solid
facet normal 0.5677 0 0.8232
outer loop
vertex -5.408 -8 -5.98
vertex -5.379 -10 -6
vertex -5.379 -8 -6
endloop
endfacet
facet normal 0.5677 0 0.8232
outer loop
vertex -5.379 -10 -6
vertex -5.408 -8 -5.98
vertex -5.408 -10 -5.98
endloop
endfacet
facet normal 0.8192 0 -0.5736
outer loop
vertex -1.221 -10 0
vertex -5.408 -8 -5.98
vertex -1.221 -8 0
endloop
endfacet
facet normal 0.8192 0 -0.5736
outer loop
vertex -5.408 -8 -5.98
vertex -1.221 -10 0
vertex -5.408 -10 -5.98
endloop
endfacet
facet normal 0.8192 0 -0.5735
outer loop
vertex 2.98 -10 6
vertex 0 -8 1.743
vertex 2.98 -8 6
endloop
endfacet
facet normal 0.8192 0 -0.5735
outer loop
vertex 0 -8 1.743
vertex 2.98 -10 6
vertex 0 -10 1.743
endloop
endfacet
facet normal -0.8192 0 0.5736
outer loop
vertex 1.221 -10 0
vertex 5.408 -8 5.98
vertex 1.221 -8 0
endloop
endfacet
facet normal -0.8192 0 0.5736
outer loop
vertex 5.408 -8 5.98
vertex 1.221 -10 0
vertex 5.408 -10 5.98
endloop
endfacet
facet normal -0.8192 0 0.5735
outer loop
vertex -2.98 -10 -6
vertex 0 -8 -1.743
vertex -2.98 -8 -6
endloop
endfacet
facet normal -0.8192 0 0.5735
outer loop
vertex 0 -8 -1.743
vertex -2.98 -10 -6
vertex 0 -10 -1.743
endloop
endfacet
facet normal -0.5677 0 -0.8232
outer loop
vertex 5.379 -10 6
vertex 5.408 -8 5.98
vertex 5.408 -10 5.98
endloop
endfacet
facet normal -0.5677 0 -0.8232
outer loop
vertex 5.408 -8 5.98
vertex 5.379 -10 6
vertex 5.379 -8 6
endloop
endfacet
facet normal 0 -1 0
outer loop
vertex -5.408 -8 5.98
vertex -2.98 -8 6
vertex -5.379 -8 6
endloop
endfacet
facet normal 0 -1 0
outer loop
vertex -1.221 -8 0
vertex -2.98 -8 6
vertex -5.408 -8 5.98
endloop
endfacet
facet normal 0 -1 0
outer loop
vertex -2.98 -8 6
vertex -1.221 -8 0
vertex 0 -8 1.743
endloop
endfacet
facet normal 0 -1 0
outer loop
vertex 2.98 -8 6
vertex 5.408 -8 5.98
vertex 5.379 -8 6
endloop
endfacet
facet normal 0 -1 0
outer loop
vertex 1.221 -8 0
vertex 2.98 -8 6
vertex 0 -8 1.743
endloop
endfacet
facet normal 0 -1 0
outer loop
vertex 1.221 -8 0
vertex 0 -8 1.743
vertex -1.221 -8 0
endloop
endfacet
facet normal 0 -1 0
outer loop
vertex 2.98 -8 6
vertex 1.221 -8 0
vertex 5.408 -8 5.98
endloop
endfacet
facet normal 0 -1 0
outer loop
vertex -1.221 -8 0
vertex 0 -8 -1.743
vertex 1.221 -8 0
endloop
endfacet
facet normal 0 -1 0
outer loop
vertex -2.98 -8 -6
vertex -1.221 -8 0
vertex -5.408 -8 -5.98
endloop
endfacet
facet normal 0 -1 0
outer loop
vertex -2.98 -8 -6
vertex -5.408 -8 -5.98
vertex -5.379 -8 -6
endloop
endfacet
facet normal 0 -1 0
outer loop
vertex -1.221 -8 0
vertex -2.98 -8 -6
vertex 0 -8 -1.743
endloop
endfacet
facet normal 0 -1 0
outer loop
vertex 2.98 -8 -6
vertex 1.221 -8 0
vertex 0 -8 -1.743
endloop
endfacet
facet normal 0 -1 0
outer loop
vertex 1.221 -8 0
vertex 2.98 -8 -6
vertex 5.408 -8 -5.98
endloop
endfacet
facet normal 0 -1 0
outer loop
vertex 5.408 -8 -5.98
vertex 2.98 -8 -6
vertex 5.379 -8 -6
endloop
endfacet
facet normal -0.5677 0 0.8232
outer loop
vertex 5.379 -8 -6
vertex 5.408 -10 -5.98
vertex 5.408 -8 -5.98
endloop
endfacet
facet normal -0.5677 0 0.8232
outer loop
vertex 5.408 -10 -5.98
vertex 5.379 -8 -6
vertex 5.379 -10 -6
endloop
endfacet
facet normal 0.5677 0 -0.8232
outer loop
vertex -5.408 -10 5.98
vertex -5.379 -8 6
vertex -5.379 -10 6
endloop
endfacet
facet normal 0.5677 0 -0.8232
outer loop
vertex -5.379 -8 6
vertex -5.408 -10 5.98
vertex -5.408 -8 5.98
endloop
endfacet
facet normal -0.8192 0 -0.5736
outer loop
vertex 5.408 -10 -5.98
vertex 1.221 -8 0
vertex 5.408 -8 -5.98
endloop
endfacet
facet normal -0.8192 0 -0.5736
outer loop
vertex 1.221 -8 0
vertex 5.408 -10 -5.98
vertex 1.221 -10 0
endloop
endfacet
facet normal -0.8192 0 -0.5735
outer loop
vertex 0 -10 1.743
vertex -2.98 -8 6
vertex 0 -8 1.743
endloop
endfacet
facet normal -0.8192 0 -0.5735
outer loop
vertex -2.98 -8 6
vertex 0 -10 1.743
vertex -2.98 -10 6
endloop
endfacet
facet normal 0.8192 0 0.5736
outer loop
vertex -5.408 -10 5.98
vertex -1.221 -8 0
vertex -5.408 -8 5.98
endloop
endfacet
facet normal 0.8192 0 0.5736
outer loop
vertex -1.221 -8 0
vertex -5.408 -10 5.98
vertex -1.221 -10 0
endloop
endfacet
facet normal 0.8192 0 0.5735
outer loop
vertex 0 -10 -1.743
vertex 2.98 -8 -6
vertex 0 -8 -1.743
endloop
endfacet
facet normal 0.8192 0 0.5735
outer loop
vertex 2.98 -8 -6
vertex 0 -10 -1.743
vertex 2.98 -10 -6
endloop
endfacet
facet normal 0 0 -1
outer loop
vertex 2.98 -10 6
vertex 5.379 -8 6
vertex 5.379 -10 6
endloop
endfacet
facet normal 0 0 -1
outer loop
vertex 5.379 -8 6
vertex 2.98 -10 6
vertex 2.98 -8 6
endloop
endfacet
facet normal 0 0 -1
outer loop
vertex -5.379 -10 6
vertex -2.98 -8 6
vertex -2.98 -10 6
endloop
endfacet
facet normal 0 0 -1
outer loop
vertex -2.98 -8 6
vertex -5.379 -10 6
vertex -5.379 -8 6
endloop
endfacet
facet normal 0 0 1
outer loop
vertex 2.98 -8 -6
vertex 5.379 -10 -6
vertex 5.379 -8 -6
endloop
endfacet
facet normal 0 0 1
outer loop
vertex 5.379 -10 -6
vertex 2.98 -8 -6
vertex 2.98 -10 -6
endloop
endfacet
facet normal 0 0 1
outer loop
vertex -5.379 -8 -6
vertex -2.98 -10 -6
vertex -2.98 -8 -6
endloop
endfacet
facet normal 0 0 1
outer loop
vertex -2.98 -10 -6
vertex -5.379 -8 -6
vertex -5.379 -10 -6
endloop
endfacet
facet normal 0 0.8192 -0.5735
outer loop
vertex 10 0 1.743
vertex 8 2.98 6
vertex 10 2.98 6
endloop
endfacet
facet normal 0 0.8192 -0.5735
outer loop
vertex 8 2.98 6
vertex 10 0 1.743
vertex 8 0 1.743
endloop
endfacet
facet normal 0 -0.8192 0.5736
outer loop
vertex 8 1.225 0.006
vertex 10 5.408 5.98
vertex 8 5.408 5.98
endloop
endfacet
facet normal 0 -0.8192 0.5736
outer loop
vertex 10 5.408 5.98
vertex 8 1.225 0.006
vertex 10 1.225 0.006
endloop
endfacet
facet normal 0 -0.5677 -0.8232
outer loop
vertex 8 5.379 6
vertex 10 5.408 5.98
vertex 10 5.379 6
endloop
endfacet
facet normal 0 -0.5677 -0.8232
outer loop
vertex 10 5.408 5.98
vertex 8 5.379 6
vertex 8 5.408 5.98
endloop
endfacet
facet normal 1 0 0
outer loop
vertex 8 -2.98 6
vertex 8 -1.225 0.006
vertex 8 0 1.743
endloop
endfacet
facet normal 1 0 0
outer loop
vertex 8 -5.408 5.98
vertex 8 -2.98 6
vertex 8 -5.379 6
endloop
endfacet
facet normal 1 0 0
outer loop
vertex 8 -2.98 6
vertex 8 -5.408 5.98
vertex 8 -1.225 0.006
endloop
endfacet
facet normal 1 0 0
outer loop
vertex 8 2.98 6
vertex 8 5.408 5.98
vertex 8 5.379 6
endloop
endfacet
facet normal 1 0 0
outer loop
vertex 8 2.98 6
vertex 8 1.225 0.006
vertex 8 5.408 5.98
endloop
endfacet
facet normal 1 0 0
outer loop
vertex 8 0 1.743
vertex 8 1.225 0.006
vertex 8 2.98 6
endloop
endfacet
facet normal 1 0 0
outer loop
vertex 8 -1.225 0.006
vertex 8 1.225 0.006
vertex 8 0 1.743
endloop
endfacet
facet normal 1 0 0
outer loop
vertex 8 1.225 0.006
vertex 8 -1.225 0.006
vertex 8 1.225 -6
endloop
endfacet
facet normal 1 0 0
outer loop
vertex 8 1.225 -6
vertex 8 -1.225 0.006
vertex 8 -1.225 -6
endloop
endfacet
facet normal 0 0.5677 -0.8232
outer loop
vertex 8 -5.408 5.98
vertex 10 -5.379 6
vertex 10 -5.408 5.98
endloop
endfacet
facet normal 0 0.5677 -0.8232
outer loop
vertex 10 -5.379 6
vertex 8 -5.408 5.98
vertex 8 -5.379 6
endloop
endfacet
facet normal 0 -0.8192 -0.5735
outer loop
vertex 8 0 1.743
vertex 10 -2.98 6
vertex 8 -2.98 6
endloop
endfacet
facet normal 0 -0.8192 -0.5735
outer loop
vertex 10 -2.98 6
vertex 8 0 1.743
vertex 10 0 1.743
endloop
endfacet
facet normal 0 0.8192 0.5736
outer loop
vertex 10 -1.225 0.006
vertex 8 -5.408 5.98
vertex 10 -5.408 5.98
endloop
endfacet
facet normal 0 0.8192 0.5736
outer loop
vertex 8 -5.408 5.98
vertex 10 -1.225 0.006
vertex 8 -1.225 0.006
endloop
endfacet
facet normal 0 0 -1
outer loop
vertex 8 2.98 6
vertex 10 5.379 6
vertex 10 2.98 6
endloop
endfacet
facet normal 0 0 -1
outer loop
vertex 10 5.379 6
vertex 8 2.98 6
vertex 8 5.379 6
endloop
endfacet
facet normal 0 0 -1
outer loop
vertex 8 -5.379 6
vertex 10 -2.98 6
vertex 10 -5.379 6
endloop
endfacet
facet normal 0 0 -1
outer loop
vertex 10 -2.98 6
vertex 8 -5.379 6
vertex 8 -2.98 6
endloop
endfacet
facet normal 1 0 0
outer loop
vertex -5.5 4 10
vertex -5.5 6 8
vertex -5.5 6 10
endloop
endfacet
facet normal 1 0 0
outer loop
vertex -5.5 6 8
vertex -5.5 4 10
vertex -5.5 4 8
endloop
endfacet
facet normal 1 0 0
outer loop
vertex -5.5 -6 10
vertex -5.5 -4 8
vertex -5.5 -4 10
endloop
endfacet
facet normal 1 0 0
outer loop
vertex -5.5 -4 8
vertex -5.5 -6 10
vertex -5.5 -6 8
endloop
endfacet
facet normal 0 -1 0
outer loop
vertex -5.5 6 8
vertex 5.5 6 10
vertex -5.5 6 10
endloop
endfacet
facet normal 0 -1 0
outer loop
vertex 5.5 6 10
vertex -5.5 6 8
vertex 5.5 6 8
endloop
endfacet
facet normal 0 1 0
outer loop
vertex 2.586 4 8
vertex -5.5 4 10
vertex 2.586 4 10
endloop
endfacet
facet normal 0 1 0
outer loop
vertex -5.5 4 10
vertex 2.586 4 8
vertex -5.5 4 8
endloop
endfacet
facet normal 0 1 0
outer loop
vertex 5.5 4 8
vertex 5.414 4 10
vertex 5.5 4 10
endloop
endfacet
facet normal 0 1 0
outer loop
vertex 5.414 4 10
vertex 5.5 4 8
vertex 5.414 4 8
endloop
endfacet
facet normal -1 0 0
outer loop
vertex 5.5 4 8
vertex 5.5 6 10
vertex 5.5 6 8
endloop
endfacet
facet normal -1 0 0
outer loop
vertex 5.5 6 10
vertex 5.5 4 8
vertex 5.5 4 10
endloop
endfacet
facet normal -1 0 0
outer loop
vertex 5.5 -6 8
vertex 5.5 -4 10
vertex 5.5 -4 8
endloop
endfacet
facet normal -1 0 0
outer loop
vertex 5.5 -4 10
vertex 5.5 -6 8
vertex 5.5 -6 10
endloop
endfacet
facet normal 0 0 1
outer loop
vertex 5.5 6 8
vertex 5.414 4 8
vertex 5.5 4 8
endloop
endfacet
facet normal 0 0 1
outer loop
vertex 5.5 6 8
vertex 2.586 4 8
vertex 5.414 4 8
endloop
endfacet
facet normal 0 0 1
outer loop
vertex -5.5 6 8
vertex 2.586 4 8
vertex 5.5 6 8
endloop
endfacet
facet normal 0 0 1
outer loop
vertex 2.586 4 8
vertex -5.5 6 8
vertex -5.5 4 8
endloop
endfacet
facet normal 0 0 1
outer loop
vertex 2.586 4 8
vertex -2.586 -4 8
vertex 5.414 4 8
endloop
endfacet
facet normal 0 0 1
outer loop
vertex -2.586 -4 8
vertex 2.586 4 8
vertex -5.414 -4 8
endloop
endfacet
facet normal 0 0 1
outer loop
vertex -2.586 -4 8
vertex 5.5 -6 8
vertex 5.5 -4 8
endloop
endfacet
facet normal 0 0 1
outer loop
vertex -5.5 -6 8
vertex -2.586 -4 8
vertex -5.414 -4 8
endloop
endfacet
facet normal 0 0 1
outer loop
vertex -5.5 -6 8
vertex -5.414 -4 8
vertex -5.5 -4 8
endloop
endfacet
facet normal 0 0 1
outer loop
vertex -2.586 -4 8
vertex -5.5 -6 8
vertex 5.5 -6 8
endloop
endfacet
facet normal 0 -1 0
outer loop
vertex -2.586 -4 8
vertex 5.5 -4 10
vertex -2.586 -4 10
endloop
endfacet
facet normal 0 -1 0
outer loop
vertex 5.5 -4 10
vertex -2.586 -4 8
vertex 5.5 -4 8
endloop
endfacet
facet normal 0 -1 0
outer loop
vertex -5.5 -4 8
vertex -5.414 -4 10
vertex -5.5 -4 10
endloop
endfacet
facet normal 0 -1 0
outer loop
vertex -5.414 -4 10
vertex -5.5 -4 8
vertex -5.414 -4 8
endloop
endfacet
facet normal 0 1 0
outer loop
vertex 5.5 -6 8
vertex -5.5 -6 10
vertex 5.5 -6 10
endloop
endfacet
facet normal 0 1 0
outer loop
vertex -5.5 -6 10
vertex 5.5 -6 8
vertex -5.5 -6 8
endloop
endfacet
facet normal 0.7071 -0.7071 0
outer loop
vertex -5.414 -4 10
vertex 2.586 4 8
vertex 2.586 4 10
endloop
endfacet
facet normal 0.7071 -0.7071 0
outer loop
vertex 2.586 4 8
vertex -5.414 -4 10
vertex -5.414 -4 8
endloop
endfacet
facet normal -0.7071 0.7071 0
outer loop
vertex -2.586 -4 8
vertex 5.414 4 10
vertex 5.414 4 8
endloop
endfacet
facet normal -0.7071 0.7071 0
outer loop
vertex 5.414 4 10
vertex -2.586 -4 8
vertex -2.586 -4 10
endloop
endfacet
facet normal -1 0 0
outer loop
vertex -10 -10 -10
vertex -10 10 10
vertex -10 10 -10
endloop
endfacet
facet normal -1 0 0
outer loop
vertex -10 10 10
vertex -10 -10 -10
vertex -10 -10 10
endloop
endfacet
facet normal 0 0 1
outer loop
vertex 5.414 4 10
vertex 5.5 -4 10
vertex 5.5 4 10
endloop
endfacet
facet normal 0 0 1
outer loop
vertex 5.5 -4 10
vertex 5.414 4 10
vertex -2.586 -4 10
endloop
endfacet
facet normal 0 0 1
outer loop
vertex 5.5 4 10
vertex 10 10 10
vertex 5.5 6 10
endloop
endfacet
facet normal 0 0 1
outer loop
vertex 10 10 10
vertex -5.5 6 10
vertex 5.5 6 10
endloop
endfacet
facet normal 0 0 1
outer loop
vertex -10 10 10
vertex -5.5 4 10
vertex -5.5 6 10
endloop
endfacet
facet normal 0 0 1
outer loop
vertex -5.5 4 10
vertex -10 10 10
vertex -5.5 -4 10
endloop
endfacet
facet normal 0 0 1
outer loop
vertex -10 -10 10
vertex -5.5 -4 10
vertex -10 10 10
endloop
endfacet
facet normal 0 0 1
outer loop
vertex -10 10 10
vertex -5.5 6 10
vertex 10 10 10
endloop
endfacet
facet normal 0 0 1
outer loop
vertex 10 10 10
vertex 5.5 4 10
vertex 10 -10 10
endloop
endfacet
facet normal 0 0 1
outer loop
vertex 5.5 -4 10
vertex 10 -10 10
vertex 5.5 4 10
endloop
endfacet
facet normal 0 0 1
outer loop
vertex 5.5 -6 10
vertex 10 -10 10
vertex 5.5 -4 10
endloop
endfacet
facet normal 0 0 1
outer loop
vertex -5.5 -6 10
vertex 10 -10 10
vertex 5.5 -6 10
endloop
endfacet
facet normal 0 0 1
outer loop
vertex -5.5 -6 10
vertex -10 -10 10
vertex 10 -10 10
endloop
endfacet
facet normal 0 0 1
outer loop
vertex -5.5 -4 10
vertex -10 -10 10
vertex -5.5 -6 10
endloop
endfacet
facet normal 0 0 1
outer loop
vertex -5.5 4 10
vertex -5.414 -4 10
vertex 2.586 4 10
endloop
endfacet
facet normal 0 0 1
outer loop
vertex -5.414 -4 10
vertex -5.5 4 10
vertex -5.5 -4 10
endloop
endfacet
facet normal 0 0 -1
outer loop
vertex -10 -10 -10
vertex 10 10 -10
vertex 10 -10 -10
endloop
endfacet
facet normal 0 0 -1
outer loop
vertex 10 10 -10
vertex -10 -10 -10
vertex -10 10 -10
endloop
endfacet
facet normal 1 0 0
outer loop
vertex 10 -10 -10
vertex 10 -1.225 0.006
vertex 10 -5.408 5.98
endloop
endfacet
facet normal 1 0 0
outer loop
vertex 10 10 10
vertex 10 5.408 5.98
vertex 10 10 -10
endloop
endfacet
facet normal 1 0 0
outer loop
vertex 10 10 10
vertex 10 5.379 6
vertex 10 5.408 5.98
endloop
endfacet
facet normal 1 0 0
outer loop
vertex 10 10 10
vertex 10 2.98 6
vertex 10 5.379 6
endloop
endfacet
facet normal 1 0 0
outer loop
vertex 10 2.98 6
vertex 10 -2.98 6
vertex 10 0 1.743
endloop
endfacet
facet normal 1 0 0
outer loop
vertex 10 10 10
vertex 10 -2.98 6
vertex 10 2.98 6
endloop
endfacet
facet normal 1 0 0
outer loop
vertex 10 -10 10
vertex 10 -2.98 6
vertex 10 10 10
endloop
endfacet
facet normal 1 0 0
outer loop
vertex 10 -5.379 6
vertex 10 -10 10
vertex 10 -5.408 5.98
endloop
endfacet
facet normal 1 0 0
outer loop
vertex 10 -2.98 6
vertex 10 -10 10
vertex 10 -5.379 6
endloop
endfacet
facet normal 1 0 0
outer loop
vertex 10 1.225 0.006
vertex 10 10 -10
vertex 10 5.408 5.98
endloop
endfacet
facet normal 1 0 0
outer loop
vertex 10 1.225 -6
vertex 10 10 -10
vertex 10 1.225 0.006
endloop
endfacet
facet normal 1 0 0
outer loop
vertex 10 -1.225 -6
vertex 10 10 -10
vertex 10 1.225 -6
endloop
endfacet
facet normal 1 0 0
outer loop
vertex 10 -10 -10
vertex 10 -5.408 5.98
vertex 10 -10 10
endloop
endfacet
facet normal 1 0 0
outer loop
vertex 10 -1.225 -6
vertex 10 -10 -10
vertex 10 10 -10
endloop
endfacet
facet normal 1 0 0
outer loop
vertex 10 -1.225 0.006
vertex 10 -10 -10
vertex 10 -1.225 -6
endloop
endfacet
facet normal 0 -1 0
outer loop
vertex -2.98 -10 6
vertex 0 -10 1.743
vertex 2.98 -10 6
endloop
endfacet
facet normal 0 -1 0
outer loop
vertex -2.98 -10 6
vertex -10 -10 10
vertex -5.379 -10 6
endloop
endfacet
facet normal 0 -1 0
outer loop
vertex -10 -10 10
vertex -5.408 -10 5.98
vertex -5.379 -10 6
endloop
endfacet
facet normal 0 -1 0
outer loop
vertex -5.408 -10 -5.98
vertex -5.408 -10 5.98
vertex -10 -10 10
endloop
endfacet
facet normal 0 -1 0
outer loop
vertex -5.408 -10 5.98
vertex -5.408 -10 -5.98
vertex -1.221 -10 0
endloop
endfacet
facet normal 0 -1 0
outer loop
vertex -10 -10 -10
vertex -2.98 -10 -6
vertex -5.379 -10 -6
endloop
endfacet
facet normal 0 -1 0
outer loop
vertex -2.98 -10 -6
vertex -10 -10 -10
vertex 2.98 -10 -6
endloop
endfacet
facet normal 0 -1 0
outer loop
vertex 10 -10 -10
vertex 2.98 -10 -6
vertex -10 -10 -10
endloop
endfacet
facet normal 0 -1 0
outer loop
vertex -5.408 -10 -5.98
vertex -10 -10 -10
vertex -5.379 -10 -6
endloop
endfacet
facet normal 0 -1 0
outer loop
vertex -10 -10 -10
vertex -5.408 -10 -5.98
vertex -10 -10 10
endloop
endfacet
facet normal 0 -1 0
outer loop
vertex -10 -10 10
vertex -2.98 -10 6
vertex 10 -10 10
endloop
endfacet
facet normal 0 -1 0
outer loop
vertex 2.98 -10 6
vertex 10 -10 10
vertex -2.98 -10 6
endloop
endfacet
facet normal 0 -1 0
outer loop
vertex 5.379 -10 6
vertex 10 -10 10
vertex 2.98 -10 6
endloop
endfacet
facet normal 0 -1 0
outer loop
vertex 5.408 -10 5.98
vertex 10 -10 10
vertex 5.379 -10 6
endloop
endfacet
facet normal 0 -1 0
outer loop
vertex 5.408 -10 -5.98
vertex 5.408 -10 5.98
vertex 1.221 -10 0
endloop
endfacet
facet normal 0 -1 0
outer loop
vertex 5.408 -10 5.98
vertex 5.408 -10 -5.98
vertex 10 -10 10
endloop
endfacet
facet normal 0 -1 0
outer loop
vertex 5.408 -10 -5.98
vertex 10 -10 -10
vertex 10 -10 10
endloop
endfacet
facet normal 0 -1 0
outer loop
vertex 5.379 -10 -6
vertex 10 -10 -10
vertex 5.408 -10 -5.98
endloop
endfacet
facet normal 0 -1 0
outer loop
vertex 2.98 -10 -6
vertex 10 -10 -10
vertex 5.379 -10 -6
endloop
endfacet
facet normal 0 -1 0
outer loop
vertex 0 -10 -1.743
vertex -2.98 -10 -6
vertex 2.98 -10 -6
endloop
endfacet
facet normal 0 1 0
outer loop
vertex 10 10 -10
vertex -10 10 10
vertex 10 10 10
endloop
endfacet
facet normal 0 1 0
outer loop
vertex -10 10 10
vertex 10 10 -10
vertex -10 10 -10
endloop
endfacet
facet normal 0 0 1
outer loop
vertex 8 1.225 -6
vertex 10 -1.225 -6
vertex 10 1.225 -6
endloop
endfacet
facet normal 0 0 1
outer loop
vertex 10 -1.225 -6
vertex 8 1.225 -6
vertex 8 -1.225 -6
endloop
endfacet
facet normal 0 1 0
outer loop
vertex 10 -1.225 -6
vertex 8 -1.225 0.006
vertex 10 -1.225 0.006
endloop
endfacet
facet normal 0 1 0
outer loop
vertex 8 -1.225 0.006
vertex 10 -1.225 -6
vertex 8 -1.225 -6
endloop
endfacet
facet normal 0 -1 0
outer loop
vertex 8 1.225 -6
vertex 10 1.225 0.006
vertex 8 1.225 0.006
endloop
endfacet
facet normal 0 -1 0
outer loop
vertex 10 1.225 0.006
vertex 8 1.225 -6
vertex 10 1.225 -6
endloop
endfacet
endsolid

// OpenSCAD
// file: ../src/xyzcalicube.scad
// src/xyzcalicube.scad
// XYZ Calibration Cube Library
// Version Author: Cameron K. Brooks

/* [General Parameters] */
// The size of the calibration cube
cube_size = 20;

/* [Calculated Parameters] */
// The value to use for creating the model preview (lower is faster)
preview_quality_value = 24;

// The value to use for creating the final model render (higher is more detailed)
render_quality_value = 48;

// Calculate the rendering quality
$fn = $preview ? preview_quality_value : render_quality_value;

/* [Main Model Generation Module] */

// Generates the XYZ calibration cube
module generate_xyz_cali_cube(cube_size = 20) {
  s = cube_size;
  // Scale all hard-coded offsets proportionally to cube_size
  sc = s / 20;

  rotate([0, 0, 180])
    difference() {
      cube([s, s, s], center=true);

      // X cut out
      difference() {
        union() {
          translate([0, 9.005 * sc, 0]) rotate([0, 55, 0]) cube([16 * sc, 2.01 * sc, 2 * sc], center=true);
          translate([0, 9.005 * sc, 0]) rotate([0, -55, 0]) cube([16 * sc, 2.01 * sc, 2 * sc], center=true);
        }
        translate([0, 8.5 * sc, 7 * sc]) cube([16 * sc, 3.5 * sc, 2 * sc], center=true);
        translate([0, 8.5 * sc, -7 * sc]) cube([16 * sc, 3.5 * sc, 2 * sc], center=true);
      }

      // Y cut out
      rotate([0, 0, 90])
        difference() {
          union() {
            translate([0, 9.005 * sc, 0]) rotate([0, 55, 0]) cube([16 * sc, 2.01 * sc, 2 * sc], center=true);
            translate([0, 9.005 * sc, 0]) rotate([0, -55, 0]) cube([16 * sc, 2.01 * sc, 2 * sc], center=true);
          }
          translate([0, 8.5 * sc, 7 * sc]) cube([16 * sc, 3.5 * sc, 2 * sc], center=true);
          translate([0, 8.5 * sc, -4 * sc]) cube([16 * sc, 3.5 * sc, 8 * sc], center=true);
        }
      translate([-9 * sc, 0, -2.9 * sc]) cube([2 * sc, 2.45 * sc, 6.2 * sc], center=true);

      // Z cut out
      rotate([90, 0, 0])
        intersection() {
          translate([0, 9.005 * sc, 0]) cube([11 * sc, 2.01 * sc, 12 * sc], center=true);
          union() {
            translate([0, 9.005 * sc, 5 * sc]) cube([11 * sc, 2.01 * sc, 2 * sc], center=true);
            translate([0, 9.005 * sc, -5 * sc]) cube([11 * sc, 2.01 * sc, 2 * sc], center=true);
            translate([0, 9.005 * sc, 0]) rotate([0, 45, 0]) cube([16 * sc, 2.01 * sc, 2 * sc], center=true);
          }
        }
    }
}
// main file
// examples/xyzcalicube_example.scad

include <../src/xyzcalicube.scad>;

/* [User Parameters] */

// The size of the calibration cube
cube_size = 20;

/* [Quality Settings] */

// Set the rendering quality
preview_quality_value = 24;
render_quality_value = 48; // Increase for higher detail

$fn = $preview ? preview_quality_value : render_quality_value;

/* [Generate the XYZ Calibration Cube] */

generate_xyz_cali_cube(
  cube_size=cube_size
);
